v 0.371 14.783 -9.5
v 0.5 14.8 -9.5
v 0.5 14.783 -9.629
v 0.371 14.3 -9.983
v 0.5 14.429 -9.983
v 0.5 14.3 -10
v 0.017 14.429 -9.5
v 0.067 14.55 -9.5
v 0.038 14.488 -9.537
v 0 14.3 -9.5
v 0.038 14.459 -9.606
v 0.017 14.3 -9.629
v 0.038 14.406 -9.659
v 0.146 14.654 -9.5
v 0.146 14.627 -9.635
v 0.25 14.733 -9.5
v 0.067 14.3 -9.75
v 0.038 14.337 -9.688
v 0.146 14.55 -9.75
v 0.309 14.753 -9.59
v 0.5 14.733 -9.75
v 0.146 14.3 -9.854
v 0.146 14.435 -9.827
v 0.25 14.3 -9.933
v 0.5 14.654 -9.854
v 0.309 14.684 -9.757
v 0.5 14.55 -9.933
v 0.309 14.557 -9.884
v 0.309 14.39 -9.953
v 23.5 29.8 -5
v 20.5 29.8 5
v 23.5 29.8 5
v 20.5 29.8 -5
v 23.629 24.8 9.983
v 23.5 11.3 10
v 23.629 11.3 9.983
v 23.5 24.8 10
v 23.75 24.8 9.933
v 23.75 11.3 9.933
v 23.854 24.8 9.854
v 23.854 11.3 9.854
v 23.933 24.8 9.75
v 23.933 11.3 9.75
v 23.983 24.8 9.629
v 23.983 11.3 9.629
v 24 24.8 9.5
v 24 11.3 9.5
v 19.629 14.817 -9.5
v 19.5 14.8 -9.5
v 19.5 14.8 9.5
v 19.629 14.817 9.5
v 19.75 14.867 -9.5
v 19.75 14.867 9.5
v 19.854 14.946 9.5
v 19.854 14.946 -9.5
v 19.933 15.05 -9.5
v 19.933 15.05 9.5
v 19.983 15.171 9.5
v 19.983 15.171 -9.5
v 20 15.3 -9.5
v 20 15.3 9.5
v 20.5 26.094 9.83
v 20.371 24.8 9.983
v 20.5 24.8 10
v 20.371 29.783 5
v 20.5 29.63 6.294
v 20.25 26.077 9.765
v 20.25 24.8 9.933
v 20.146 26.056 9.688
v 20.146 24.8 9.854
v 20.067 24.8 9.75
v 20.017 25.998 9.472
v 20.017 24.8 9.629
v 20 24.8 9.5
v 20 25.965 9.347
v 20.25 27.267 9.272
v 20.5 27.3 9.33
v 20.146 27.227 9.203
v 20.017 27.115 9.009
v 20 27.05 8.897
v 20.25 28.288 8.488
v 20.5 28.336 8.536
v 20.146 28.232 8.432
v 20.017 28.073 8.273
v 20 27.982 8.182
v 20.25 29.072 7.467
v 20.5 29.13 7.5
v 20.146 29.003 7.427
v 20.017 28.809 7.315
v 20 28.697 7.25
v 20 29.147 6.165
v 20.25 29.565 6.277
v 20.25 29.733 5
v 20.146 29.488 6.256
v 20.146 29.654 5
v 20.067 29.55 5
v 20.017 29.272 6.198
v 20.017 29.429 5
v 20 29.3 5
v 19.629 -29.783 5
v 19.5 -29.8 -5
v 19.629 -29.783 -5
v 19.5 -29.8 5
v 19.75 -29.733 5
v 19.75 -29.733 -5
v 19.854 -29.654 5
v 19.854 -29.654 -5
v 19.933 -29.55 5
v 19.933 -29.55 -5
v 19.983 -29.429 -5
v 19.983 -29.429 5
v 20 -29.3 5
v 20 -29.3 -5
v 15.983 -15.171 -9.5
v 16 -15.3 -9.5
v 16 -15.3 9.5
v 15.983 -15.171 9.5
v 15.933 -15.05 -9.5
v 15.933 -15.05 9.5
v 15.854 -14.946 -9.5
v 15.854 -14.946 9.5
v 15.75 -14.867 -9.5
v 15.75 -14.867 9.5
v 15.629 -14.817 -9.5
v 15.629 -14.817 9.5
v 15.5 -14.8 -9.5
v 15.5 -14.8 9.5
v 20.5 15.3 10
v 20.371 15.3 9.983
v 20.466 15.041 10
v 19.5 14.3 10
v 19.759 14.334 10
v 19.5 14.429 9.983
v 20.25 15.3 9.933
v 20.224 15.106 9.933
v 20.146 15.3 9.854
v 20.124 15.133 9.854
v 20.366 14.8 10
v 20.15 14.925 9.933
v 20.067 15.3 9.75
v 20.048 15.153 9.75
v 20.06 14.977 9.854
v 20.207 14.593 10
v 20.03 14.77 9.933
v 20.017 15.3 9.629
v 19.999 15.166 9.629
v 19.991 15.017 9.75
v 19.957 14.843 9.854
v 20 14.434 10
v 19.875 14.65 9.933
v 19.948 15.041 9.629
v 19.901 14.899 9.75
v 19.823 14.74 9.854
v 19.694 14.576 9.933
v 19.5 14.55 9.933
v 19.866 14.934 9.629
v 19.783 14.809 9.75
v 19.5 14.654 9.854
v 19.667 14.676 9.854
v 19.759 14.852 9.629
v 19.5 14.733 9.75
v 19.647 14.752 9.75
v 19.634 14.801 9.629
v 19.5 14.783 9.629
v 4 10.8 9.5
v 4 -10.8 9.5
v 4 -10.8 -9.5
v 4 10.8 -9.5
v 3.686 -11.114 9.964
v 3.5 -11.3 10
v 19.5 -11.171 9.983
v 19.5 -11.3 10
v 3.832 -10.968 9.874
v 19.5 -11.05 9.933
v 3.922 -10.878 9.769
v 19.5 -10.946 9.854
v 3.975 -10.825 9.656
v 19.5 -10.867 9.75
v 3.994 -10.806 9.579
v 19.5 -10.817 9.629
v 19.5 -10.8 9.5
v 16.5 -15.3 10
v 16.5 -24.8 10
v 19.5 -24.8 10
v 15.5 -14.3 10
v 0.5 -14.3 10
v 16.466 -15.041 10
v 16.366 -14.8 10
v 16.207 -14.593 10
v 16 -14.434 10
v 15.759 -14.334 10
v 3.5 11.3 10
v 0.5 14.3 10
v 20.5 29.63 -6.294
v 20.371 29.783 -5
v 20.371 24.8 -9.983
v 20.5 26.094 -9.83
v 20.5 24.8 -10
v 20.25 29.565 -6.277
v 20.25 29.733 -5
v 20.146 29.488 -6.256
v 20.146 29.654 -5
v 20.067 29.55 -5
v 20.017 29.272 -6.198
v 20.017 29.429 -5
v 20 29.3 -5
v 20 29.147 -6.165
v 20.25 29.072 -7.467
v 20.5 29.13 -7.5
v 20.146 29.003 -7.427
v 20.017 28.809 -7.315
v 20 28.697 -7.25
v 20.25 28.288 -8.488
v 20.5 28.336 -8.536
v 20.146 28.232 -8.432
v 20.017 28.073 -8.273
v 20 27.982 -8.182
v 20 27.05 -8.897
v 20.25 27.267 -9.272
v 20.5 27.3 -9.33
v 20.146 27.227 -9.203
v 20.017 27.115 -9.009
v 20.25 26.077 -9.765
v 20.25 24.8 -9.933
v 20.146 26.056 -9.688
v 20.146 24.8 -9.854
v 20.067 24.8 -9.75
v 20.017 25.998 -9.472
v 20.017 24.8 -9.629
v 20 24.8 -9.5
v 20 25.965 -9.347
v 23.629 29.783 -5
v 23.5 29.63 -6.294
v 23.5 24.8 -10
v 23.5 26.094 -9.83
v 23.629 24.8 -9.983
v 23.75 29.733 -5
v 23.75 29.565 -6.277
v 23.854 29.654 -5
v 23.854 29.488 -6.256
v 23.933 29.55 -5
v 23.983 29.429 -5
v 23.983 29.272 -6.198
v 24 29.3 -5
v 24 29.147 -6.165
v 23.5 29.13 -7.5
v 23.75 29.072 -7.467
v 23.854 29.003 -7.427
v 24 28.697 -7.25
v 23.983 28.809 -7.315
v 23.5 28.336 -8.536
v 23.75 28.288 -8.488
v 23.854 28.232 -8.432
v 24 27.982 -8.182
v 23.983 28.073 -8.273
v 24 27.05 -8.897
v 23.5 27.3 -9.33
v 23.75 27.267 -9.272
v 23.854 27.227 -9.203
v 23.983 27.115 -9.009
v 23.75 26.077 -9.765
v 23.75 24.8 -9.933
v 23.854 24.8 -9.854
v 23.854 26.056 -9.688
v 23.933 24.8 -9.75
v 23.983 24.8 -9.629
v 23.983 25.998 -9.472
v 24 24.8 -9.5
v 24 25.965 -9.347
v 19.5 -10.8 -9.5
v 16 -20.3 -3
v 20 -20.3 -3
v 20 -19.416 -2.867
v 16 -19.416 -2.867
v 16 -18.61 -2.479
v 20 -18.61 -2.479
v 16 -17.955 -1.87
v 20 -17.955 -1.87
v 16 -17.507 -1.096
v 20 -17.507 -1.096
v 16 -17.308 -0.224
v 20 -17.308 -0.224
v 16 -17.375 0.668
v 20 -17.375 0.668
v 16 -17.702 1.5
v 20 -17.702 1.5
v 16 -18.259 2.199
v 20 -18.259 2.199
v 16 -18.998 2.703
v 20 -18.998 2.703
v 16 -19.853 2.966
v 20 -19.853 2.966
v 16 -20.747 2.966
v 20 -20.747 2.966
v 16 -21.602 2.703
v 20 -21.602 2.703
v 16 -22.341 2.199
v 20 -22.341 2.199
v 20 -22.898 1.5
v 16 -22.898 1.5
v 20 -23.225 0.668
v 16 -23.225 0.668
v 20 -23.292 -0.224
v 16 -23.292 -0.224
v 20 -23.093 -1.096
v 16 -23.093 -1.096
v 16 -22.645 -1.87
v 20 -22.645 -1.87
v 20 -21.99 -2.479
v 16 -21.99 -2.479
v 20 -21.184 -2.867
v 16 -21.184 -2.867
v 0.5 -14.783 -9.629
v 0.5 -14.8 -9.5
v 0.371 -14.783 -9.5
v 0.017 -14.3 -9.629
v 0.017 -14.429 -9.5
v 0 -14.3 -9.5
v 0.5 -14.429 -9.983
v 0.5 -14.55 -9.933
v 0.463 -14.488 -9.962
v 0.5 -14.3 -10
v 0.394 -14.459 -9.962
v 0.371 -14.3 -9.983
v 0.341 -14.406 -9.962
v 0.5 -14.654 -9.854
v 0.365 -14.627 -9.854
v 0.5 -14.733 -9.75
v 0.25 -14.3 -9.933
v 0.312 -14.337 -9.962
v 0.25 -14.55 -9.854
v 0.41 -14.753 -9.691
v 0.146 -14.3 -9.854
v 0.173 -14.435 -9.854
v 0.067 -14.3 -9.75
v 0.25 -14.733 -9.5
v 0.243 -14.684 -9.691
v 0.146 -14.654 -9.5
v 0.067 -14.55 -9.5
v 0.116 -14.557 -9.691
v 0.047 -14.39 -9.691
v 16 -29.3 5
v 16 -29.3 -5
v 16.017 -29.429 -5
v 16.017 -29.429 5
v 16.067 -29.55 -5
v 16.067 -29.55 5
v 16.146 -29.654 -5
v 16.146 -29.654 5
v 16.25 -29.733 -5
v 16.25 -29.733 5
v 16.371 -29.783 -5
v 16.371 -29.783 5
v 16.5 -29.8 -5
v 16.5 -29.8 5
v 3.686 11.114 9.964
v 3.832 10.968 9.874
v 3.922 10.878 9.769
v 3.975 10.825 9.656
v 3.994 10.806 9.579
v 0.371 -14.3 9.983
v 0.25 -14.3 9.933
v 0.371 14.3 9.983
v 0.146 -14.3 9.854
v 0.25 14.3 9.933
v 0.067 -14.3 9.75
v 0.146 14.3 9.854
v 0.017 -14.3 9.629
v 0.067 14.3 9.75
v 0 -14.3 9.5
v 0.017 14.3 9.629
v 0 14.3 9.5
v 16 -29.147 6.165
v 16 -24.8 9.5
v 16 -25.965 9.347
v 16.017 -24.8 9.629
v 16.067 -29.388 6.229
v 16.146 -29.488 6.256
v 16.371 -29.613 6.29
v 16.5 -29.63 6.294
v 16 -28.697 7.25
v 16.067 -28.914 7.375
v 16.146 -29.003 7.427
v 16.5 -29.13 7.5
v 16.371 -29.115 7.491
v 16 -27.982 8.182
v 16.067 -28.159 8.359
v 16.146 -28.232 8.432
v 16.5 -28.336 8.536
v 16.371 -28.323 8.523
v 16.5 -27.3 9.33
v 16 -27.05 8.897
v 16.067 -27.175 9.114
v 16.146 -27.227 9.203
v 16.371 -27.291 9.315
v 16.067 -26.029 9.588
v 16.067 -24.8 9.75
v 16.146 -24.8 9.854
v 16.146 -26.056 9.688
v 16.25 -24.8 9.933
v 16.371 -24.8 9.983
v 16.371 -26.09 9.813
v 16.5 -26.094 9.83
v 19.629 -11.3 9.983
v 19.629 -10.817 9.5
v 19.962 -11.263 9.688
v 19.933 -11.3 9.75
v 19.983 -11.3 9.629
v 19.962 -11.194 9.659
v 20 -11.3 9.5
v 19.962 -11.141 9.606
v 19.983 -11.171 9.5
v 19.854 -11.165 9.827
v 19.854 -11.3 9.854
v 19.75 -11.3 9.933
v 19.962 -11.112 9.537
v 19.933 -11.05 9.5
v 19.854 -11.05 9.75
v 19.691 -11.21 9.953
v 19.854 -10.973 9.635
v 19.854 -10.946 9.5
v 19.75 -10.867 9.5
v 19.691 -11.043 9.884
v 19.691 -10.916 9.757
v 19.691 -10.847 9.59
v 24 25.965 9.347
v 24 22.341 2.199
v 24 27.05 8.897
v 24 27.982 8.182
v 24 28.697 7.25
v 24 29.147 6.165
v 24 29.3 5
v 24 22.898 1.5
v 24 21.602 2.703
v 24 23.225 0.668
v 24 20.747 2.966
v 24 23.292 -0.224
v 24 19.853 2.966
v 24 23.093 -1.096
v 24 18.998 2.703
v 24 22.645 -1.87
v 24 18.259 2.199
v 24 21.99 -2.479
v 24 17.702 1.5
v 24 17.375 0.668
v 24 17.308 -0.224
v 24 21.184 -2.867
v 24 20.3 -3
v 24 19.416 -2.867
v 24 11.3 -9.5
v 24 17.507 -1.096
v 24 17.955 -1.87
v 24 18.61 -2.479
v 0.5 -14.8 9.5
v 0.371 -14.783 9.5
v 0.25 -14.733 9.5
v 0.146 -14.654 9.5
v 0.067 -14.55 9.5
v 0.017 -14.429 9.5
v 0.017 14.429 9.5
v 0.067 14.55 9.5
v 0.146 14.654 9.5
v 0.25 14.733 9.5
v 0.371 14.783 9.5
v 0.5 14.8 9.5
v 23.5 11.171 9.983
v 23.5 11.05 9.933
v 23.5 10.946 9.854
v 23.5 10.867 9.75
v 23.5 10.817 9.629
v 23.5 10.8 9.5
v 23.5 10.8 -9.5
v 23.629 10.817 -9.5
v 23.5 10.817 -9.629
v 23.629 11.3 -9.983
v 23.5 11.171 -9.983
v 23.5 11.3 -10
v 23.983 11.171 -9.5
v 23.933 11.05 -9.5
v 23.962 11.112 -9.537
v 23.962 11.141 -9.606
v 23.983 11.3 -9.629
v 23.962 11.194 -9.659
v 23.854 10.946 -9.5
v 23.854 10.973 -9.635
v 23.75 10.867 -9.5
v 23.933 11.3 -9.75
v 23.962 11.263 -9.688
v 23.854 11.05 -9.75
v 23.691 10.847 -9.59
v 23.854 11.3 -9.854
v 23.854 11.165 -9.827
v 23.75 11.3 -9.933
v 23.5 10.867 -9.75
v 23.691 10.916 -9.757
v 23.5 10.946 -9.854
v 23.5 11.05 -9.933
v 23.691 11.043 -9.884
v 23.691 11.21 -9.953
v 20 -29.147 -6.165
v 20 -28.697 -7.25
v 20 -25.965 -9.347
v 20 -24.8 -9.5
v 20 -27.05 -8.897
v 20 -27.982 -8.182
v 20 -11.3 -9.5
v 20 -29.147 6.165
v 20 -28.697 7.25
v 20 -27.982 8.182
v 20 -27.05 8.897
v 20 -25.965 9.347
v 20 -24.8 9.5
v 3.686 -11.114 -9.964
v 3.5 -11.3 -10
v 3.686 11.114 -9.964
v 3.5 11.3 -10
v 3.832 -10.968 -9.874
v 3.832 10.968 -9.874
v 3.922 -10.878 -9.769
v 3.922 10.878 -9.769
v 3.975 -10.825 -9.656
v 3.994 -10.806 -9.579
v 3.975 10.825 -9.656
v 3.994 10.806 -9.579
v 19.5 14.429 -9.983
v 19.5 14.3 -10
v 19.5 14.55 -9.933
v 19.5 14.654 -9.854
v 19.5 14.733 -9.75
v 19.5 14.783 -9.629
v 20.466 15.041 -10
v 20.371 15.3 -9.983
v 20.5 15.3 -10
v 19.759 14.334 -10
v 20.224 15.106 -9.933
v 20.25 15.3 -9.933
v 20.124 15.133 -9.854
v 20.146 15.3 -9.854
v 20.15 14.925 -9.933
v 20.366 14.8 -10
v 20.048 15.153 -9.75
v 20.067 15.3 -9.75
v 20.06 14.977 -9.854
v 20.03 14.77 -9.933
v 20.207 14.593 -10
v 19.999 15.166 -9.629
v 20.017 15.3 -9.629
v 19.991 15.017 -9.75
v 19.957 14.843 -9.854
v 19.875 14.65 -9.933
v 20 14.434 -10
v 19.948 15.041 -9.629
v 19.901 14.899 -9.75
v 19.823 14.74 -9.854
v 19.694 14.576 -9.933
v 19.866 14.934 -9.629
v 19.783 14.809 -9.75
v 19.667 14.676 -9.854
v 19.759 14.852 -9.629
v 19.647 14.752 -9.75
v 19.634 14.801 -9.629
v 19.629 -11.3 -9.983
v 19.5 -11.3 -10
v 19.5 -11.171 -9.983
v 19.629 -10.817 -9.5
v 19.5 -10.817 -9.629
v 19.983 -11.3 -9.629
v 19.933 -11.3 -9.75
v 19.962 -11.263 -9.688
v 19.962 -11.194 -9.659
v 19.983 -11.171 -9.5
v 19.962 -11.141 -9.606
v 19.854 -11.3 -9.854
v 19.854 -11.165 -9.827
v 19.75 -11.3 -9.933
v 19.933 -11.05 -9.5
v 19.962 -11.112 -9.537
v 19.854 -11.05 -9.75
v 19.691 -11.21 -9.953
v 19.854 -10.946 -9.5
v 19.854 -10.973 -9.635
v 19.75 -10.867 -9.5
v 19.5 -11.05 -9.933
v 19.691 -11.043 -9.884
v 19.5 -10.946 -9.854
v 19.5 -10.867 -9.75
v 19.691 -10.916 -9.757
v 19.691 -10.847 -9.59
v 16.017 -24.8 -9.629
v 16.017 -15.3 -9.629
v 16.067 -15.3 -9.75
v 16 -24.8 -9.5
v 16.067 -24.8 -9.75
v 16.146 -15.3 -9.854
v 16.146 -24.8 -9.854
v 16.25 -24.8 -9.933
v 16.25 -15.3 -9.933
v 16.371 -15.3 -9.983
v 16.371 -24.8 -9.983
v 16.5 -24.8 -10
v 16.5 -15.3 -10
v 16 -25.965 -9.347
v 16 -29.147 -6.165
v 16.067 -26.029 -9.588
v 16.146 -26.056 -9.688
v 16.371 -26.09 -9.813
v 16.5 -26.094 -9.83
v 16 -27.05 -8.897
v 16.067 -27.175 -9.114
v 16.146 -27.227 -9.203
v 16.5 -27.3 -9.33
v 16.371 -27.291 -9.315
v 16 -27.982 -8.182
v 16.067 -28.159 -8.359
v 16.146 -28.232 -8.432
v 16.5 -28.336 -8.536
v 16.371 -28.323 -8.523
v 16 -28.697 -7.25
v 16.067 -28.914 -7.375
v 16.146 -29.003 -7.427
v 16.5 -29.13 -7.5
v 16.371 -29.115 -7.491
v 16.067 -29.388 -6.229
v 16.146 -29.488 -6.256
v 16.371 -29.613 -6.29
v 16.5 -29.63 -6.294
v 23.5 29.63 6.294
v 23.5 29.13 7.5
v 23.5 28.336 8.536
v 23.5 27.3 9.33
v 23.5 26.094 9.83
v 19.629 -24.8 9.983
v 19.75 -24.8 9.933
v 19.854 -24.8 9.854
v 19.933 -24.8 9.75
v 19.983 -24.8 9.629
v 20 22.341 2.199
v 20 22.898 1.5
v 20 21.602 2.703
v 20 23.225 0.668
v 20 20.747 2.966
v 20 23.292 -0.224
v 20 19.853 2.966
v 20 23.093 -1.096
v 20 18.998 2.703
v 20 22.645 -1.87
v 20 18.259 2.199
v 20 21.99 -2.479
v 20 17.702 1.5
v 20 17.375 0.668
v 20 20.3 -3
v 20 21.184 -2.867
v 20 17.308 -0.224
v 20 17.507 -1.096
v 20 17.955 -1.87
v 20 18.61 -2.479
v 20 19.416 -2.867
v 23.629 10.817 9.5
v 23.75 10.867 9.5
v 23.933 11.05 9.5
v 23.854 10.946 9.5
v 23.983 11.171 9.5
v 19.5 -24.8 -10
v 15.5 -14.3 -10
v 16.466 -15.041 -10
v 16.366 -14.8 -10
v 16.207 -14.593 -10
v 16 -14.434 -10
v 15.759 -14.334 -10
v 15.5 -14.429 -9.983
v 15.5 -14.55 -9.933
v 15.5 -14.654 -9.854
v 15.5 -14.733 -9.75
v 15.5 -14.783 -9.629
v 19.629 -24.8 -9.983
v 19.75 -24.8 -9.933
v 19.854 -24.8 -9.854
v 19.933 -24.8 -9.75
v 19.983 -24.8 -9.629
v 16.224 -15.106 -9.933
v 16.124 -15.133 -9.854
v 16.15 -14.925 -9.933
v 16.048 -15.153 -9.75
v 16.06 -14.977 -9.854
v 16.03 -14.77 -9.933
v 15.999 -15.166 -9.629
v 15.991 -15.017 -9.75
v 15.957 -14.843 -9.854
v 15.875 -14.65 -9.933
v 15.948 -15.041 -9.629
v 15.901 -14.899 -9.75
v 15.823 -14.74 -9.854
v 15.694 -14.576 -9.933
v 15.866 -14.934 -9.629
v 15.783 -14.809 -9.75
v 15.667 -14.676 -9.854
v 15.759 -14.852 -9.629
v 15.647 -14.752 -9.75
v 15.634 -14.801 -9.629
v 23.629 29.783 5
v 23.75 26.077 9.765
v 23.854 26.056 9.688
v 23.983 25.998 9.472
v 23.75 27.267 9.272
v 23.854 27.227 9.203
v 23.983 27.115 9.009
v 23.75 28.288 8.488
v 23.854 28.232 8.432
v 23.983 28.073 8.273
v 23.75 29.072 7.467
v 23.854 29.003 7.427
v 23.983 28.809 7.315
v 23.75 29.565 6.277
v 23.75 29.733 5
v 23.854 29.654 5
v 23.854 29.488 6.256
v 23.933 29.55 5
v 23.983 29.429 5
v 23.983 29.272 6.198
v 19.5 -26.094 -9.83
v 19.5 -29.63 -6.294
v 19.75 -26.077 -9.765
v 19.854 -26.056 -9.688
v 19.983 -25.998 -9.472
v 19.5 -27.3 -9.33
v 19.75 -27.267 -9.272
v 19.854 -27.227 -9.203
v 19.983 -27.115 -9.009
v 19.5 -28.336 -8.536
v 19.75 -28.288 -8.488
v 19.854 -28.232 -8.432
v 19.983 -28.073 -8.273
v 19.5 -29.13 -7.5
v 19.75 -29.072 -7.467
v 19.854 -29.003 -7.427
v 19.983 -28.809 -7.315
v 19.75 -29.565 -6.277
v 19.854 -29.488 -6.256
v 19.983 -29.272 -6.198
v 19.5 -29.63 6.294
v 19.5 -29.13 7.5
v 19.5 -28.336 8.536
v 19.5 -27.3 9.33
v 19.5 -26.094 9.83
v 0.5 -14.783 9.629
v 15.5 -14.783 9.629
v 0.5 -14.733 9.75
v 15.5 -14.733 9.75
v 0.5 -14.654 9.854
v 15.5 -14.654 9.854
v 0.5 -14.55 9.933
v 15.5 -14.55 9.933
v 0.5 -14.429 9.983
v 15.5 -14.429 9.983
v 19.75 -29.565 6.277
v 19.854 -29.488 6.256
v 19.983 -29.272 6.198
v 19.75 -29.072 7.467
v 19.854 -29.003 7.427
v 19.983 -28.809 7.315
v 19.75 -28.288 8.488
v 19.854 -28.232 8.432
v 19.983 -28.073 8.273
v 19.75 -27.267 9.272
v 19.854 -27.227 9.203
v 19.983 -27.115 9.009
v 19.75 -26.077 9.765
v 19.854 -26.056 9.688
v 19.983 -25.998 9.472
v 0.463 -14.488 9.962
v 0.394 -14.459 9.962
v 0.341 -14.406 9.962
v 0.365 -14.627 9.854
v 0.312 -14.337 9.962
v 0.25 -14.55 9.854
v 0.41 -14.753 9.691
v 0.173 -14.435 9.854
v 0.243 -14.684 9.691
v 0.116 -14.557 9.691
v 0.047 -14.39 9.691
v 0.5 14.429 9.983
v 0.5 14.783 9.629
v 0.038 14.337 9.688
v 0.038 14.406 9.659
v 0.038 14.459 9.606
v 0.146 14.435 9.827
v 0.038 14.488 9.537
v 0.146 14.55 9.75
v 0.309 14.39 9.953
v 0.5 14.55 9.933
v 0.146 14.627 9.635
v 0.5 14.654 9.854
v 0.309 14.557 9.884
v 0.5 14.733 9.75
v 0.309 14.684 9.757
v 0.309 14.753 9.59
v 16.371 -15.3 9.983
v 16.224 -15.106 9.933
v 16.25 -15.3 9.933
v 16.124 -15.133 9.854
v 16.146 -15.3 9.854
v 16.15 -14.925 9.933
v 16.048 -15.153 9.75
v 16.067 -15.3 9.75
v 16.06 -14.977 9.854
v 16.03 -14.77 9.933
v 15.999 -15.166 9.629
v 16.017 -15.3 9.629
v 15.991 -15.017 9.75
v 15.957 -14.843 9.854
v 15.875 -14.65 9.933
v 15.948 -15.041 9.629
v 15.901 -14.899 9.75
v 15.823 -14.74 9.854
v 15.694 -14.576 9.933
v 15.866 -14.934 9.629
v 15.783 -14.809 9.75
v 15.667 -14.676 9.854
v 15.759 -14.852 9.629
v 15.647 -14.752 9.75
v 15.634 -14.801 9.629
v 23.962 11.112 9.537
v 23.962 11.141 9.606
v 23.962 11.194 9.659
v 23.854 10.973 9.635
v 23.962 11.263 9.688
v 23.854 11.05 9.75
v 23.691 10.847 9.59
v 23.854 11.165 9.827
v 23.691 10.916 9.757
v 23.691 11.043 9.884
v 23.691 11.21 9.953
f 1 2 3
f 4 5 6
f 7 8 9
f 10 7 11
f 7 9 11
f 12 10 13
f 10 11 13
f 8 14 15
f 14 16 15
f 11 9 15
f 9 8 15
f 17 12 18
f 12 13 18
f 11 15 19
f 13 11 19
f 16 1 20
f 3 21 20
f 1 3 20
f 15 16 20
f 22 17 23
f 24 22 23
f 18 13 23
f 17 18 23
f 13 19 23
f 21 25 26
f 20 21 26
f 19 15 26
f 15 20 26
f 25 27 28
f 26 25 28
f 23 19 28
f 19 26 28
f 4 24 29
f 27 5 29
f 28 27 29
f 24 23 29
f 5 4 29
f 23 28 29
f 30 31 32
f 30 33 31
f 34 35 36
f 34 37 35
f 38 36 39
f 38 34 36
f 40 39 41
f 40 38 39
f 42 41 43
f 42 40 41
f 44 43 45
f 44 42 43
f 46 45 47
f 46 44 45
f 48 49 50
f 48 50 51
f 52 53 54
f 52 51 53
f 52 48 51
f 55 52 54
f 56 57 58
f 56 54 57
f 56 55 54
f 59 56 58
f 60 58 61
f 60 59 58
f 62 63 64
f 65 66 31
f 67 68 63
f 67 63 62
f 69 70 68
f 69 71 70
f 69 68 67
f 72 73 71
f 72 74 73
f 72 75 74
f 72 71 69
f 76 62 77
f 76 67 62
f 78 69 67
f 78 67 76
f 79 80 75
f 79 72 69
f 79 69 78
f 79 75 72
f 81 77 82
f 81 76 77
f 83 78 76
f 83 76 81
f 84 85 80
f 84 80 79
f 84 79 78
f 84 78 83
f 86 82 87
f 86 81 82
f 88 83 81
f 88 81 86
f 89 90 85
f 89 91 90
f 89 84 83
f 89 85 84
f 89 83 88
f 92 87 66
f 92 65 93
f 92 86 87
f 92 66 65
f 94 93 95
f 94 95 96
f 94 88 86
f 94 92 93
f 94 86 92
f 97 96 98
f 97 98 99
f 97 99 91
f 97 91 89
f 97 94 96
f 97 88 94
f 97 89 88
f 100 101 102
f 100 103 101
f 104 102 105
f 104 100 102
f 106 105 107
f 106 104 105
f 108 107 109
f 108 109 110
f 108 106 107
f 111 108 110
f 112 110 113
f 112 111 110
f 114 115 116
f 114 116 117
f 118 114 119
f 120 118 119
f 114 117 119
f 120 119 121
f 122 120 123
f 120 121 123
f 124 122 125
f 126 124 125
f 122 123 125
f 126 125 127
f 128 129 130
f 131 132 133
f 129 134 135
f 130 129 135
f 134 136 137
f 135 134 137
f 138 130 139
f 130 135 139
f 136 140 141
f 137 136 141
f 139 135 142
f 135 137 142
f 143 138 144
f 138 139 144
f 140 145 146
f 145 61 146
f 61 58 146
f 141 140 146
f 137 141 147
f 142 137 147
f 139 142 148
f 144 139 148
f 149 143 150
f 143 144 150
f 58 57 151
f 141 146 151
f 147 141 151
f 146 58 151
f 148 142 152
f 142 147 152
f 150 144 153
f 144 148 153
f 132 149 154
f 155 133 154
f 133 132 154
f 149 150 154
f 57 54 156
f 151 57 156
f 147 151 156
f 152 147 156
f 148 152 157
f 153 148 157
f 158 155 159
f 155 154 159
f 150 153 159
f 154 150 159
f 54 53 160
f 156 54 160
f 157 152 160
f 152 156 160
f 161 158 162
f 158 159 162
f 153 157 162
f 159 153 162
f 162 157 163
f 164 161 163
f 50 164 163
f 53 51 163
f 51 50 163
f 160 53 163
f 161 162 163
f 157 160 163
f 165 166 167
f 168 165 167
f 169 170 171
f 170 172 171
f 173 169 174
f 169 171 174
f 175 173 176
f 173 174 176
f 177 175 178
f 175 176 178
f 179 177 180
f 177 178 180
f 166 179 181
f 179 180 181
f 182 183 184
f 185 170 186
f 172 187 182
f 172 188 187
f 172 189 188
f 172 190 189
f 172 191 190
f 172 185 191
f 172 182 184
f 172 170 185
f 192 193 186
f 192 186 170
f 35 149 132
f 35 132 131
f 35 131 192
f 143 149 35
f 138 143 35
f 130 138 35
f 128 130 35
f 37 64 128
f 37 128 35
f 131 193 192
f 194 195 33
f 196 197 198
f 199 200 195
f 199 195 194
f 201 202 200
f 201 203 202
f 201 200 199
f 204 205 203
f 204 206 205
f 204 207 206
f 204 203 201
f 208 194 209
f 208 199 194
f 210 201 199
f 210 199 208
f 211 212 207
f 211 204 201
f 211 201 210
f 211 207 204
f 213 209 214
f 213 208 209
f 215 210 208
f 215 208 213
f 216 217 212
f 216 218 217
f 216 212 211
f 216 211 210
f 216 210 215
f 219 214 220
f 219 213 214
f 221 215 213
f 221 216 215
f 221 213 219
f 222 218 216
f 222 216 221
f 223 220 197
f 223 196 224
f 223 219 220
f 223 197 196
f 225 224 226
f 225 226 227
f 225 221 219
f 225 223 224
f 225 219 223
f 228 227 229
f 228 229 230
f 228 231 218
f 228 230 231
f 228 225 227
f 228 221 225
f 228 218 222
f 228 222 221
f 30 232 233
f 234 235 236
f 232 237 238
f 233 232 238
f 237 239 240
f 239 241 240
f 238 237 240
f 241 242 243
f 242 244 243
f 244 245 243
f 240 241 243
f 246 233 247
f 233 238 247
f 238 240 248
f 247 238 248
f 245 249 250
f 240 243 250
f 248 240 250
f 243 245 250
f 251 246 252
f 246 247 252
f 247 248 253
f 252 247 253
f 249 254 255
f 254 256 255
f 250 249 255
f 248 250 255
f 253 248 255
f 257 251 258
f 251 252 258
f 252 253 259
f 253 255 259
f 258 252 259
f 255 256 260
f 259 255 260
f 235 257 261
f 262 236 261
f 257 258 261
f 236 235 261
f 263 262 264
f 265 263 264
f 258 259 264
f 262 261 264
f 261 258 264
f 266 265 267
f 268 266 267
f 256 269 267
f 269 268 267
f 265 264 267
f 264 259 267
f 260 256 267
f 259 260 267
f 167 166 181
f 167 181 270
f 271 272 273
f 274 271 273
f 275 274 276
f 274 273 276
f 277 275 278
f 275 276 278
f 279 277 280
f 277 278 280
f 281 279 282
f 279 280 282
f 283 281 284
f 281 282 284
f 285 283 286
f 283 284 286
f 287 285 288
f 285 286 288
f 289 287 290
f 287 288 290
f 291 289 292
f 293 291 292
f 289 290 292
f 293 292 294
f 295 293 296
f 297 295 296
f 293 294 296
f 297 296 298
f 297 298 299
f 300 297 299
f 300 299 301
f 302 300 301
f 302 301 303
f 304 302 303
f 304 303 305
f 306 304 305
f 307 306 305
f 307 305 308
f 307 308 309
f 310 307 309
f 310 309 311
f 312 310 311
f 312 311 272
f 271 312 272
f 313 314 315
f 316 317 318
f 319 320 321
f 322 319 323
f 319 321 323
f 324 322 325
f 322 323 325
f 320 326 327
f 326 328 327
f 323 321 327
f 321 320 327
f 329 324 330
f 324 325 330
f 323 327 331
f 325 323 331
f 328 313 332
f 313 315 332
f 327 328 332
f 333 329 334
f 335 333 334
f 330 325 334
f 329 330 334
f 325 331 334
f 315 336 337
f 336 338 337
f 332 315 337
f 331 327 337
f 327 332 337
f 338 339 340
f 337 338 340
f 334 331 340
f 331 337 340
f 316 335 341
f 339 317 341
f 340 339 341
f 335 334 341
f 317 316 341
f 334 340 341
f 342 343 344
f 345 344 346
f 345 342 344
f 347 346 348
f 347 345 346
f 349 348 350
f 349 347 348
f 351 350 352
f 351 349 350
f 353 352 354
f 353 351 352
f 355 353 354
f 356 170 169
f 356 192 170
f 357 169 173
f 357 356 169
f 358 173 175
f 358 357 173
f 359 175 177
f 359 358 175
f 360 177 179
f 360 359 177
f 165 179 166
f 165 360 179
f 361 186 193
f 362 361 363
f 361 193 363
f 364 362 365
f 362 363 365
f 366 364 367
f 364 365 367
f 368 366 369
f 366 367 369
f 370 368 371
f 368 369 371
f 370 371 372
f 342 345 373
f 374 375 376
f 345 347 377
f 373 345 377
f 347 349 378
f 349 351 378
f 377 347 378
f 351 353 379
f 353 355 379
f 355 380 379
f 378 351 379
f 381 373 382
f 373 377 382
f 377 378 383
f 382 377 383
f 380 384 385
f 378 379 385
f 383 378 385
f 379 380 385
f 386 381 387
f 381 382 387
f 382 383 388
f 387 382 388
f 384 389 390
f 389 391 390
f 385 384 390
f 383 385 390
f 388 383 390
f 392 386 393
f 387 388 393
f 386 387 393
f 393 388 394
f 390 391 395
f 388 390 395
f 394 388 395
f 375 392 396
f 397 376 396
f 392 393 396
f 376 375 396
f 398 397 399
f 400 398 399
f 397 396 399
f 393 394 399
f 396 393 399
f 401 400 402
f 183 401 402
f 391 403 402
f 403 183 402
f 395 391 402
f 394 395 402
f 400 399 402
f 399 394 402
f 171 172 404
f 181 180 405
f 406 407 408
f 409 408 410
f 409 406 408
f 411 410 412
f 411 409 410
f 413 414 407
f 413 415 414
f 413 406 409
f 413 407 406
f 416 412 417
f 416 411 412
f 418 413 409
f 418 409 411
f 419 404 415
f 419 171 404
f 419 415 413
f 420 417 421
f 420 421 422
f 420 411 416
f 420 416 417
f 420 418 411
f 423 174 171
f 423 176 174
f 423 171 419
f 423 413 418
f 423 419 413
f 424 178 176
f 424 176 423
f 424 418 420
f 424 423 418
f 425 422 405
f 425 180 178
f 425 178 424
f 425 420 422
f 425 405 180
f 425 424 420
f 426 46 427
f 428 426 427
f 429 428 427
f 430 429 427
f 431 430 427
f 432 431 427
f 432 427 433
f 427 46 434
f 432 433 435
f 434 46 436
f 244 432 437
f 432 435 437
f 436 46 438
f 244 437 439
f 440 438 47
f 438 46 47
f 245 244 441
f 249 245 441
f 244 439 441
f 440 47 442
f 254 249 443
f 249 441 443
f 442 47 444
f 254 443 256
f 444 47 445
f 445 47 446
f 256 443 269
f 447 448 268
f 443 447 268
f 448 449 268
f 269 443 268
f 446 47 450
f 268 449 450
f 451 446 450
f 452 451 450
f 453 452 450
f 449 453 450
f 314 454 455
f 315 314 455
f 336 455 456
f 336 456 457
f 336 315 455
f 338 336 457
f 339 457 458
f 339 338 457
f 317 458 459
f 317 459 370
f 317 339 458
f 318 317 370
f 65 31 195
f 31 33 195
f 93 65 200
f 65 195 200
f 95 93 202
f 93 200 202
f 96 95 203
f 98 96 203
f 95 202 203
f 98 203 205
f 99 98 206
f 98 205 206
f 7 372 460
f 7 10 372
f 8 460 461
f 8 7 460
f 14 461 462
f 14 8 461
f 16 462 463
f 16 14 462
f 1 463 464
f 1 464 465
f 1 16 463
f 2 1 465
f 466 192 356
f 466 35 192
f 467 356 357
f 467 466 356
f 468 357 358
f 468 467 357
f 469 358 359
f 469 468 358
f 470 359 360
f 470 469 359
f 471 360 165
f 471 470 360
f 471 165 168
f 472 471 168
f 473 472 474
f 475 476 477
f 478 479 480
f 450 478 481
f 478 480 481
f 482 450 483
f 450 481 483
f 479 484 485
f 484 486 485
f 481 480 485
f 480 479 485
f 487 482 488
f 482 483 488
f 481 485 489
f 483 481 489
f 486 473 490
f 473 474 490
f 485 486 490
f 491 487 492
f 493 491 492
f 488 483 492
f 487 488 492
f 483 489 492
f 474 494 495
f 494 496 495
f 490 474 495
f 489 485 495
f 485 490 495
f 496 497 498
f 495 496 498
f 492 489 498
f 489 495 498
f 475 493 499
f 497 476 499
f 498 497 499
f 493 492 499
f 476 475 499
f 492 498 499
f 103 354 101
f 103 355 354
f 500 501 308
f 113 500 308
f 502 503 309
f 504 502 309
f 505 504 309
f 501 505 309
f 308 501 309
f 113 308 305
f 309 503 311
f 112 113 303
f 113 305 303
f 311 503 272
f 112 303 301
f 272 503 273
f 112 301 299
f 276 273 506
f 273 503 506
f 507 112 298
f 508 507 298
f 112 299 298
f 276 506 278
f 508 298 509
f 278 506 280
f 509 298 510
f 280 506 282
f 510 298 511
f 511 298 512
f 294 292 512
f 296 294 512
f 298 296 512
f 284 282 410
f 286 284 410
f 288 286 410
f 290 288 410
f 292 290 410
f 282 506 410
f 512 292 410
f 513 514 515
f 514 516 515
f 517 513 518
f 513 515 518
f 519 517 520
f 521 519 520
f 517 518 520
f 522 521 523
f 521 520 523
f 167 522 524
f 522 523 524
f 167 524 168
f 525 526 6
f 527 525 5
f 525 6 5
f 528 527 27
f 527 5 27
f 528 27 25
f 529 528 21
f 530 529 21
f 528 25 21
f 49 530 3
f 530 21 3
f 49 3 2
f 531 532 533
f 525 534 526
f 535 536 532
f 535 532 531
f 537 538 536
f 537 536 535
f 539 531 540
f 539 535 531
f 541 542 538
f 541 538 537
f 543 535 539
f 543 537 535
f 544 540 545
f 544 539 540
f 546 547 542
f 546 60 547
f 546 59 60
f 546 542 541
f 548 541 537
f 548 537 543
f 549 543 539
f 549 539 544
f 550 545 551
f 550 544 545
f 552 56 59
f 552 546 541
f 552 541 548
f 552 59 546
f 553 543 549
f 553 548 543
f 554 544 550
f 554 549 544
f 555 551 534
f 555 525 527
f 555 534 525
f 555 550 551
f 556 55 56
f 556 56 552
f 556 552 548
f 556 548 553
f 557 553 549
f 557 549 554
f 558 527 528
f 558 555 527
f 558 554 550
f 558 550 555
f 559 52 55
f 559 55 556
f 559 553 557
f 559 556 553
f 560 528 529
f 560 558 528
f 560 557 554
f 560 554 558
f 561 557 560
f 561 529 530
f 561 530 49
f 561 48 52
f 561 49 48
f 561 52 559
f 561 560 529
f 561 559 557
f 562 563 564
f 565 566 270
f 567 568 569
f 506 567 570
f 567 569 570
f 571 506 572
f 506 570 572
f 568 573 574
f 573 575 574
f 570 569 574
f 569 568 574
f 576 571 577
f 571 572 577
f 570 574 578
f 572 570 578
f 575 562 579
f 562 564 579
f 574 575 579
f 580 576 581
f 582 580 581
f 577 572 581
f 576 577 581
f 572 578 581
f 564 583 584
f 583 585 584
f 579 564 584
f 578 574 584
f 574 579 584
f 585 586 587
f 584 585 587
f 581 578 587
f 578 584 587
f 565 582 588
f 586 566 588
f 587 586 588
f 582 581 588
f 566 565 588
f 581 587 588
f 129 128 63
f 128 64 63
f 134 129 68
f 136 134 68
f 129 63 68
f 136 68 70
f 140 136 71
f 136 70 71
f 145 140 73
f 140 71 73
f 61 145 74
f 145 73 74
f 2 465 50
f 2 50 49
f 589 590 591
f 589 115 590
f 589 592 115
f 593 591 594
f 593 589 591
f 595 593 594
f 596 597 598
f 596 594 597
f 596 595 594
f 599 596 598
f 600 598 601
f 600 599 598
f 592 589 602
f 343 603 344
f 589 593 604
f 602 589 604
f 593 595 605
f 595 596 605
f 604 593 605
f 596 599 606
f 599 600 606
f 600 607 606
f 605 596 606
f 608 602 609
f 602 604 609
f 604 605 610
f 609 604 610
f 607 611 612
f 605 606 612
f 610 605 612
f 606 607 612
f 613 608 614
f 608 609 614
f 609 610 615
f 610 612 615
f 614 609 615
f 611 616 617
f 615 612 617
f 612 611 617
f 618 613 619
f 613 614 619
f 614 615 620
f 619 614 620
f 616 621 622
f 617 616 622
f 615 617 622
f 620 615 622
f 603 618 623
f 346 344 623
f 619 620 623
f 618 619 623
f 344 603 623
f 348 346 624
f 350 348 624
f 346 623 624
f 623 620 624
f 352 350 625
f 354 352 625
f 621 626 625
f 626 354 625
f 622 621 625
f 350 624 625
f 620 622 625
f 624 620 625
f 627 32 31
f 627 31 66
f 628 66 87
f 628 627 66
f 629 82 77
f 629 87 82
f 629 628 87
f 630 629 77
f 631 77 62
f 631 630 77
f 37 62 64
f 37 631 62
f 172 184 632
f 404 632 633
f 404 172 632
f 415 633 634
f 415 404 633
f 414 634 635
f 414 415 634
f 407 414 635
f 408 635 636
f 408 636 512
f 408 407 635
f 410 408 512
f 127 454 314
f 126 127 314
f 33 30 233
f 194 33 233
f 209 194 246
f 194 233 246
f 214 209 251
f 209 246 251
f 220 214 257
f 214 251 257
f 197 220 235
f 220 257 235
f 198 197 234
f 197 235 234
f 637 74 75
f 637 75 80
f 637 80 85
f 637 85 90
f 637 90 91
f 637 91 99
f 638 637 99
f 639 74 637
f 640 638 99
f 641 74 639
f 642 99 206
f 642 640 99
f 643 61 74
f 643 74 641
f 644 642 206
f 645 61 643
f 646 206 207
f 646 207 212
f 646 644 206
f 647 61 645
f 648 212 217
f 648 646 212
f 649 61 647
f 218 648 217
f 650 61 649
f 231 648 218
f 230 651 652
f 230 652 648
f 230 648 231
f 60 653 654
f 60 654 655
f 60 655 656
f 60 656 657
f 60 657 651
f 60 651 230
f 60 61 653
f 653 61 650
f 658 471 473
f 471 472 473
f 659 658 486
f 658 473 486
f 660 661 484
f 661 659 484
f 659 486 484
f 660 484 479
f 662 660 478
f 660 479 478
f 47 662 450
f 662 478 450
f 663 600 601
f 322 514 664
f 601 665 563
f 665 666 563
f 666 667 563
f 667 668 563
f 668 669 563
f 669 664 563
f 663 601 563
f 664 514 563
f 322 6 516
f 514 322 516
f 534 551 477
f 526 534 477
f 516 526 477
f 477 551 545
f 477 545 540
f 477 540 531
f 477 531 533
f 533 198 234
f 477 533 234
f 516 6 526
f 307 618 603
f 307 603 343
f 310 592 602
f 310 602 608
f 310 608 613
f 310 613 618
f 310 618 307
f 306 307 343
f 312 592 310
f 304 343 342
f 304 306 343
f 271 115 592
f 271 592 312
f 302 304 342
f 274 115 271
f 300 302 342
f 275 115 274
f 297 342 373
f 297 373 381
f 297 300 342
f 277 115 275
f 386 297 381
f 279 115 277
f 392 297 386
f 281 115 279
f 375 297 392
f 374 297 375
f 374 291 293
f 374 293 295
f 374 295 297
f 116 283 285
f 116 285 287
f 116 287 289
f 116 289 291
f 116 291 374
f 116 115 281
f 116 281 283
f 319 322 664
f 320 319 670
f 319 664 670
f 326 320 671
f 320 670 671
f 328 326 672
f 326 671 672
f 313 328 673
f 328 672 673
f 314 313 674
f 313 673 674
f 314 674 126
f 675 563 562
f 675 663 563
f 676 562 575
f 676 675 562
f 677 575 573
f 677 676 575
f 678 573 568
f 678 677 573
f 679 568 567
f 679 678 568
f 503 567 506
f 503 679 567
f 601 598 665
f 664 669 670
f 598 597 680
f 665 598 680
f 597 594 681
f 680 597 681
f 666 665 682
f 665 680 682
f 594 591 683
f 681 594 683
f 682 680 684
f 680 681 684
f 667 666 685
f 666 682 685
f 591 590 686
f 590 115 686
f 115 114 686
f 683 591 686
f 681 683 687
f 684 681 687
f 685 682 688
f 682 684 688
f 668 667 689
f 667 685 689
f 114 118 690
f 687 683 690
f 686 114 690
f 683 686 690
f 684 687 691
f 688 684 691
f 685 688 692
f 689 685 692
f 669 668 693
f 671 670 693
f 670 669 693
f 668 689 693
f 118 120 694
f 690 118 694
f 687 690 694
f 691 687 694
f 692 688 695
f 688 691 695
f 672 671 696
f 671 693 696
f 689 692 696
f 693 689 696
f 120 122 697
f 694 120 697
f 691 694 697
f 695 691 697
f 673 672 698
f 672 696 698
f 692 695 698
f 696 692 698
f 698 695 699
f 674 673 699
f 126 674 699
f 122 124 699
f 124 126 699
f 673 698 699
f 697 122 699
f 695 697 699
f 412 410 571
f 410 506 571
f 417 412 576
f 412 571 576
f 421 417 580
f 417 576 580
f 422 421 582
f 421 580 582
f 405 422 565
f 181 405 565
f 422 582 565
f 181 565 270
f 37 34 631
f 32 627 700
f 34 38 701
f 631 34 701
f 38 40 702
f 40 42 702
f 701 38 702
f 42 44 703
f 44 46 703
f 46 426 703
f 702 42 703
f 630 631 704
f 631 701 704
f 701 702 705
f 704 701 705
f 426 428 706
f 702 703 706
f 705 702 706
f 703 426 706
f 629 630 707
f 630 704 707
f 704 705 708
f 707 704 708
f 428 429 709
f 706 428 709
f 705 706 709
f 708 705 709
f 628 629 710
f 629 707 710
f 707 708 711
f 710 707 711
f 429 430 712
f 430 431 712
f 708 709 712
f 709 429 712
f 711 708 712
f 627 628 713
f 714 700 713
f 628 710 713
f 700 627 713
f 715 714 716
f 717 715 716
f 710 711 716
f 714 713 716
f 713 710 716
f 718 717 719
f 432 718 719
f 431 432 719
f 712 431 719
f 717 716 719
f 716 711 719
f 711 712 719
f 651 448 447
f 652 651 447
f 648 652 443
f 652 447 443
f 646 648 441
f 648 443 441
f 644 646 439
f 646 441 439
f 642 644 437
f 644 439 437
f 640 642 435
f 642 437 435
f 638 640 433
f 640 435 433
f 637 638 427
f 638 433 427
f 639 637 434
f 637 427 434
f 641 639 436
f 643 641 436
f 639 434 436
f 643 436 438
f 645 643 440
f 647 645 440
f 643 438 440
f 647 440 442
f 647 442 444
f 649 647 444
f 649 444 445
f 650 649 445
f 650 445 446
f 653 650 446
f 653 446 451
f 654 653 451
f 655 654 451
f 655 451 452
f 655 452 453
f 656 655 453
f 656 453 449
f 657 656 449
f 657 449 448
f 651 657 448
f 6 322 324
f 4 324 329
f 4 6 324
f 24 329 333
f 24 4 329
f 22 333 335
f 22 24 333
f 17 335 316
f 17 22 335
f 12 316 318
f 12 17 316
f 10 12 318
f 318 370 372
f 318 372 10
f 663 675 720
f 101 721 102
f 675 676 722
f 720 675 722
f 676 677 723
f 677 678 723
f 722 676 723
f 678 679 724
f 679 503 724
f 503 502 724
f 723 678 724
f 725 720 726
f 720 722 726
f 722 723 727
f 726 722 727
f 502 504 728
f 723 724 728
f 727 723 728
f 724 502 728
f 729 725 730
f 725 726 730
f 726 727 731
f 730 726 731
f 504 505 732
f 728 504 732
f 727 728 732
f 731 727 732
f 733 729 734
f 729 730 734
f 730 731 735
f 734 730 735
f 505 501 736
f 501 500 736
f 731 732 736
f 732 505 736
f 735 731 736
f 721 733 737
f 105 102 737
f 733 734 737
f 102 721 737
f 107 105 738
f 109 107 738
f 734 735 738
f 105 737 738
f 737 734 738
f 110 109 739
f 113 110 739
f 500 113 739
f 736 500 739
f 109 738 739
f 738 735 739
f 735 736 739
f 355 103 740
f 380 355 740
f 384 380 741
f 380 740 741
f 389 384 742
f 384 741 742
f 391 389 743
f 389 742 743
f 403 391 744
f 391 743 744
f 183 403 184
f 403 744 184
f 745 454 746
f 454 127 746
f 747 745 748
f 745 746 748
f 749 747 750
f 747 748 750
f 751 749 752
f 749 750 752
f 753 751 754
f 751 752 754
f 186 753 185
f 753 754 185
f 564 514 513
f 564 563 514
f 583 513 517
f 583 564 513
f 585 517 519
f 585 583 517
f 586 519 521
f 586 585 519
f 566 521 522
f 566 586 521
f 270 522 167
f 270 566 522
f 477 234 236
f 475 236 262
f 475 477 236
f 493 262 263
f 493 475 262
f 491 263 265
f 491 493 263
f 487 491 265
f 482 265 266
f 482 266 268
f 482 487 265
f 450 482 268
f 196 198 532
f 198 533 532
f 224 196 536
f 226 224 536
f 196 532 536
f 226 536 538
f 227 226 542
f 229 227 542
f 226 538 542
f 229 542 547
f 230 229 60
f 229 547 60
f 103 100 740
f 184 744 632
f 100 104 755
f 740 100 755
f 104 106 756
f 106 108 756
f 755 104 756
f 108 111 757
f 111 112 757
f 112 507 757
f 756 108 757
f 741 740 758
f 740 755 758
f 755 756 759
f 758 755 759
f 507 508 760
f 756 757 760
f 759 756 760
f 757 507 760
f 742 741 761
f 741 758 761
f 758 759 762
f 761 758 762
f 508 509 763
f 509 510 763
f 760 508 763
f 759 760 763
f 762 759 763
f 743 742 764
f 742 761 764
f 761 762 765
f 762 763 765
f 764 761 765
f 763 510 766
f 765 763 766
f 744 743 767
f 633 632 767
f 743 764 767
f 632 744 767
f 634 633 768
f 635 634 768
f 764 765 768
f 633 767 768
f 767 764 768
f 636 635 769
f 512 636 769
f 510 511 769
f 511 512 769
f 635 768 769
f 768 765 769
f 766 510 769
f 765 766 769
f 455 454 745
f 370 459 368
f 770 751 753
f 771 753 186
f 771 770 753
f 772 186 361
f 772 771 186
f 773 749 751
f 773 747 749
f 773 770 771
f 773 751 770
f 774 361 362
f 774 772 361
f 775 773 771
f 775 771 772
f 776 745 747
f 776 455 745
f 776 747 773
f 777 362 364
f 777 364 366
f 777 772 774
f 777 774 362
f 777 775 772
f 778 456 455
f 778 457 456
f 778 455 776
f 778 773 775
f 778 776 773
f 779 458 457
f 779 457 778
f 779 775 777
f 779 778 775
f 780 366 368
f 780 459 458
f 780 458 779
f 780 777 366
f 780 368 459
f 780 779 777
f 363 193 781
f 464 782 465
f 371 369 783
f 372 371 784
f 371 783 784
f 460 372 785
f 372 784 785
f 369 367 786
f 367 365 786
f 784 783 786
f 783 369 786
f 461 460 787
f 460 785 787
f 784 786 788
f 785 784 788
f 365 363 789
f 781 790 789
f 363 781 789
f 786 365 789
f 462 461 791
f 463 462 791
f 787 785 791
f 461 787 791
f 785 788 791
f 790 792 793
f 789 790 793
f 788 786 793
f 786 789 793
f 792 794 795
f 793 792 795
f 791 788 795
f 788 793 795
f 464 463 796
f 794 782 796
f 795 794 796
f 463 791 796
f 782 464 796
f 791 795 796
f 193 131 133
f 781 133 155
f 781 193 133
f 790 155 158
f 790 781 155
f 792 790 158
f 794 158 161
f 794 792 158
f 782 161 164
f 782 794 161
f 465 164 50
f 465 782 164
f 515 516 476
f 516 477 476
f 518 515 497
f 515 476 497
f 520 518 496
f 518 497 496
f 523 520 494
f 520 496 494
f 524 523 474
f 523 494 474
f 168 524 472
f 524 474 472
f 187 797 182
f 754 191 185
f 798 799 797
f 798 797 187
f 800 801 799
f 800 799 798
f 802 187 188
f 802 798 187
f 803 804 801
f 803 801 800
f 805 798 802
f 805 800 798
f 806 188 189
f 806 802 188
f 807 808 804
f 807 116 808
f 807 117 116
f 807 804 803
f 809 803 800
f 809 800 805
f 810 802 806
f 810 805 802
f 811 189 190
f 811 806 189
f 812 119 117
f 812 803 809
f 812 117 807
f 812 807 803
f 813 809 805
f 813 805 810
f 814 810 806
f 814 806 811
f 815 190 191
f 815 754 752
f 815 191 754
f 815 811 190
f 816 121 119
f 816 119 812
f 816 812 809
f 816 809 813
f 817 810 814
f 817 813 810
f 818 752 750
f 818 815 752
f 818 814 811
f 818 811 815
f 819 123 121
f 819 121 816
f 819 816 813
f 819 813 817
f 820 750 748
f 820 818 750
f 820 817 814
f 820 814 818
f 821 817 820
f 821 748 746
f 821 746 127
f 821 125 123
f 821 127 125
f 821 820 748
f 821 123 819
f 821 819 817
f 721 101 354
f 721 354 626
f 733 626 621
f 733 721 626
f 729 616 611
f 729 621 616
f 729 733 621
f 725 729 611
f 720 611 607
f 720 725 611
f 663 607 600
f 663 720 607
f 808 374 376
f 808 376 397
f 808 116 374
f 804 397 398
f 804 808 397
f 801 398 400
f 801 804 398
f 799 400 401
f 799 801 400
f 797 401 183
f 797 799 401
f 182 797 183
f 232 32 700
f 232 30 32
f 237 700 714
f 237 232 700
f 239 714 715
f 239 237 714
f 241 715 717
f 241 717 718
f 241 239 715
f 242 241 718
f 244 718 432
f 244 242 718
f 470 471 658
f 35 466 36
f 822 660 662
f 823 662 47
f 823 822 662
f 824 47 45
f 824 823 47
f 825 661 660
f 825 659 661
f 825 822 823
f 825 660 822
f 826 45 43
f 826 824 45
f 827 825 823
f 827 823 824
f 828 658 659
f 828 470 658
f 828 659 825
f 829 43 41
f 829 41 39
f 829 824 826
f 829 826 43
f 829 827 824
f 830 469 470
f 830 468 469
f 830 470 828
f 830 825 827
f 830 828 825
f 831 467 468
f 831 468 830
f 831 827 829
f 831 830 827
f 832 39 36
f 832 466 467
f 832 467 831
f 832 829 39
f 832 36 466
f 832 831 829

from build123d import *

# Parameters (mm, degrees)
SKETCH2_W           = 20
SKETCH2_H           = 29.6
BOSS_EXTRUDE1_DEPTH = 4
SKETCH3_W           = 20
SKETCH3_H           = 4
BOSS_EXTRUDE2_DEPTH = 20
SKETCH4_W           = 20
SKETCH4_H           = 4
BOSS_EXTRUDE3_DEPTH = 16
SKETCH5_W           = 4
SKETCH5_H           = 20
BOSS_EXTRUDE4_DEPTH = 15
SKETCH6_W           = 4
SKETCH6_H           = 20
BOSS_EXTRUDE5_DEPTH = 15
FILLET1_R           = 5
FILLET3_R           = 0.5
CUT_EXTRUDE2_REACH  = 41.548
SKETCH9_R           = 3
CUT_EXTRUDE3_REACH  = 39.256
SKETCH10_R          = 3


with BuildPart() as part:
    # Sketch2 → Boss-Extrude1 (new body)
    with BuildSketch(Plane(origin=(0, 0, 0), x_dir=(0, 0, -1), z_dir=(1, 0, 0))):
        Rectangle(SKETCH2_W, SKETCH2_H)
    extrude(amount=BOSS_EXTRUDE1_DEPTH)

    # Sketch3 → Boss-Extrude2 (add)
    with BuildSketch(Plane(origin=(4, 0, 0), x_dir=(0, 0, -1), z_dir=(1, 0, 0))):
        with Locations((0, 12.8)):
            Rectangle(SKETCH3_W, SKETCH3_H)
    extrude(amount=BOSS_EXTRUDE2_DEPTH)

    # Sketch4 → Boss-Extrude3 (add)
    with BuildSketch(Plane(origin=(4, 0, 0), x_dir=(0, 0, -1), z_dir=(1, 0, 0))):
        with Locations((0, -12.8)):
            Rectangle(SKETCH4_W, SKETCH4_H)
    extrude(amount=BOSS_EXTRUDE3_DEPTH)

    # Sketch5 → Boss-Extrude4 (add)
    with BuildSketch(Plane(origin=(0, 14.8, 0), x_dir=(1, 0, 0), z_dir=(0, 1, 0))):
        with Locations((22, 0)):
            Rectangle(SKETCH5_W, SKETCH5_H)
    extrude(amount=BOSS_EXTRUDE4_DEPTH)

    # Sketch6 → Boss-Extrude5 (add)
    with BuildSketch(Plane.XZ.offset(14.8)):
        with Locations((18, 0)):
            Rectangle(SKETCH6_W, SKETCH6_H)
    extrude(amount=BOSS_EXTRUDE5_DEPTH)

    # Fillet1
    fillet1_edges = [part.edges().sort_by_distance(p)[0] for p in [
        (22, 29.8, -10),
        (22, 29.8, 10),
        (18, -29.8, 10),
        (18, -29.8, -10),
    ]]
    fillet(fillet1_edges, radius=FILLET1_R)

    # Fillet3
    fillet3_edges = [part.edges().sort_by_distance(p)[0] for p in [
        (4, 0, 10),
        (14, 10.8, 10),
        (14, 10.8, -10),
        (24, 10.8, 0),
        (24, 17.8, -10),
        (4, 0, -10),
        (12, -10.8, 10),
        (12, -10.8, -10),
        (20, -17.8, 10),
        (20, -10.8, 0),
        (10, 14.8, 10),
        (10, 14.8, -10),
        (20, 14.8, 0),
        (0, -14.8, 0),
        (8, -14.8, -10),
        (8, -14.8, 10),
        (16, -14.8, 0),
        (0, 0, 10),
        (0, 14.8, 0),
        (0, 0, -10),
        (20, -29.8, 0),
        (16, -29.8, 0),
        (16, -19.8, -10),
        (16, -19.8, 10),
        (16, -28.335533906, -8.535533906),
        (16, -28.335533906, 8.535533906),
        (24, 17.8, 10),
        (20, 19.8, 10),
        (20, -17.8, -10),
        (20, -28.335533906, -8.535533906),
        (20, -28.335533906, 8.535533906),
        (20, 19.8, -10),
        (24, 29.8, 0),
        (20, 29.8, 0),
        (20, 28.335533906, 8.535533906),
        (20, 28.335533906, -8.535533906),
        (24, 28.335533906, 8.535533906),
        (24, 28.335533906, -8.535533906),
    ]]
    fillet(fillet3_edges, radius=FILLET3_R)

    # Sketch9 → Cut-Extrude2 (cut, up to next)
    with BuildSketch(Plane(origin=(24, 0, 0), x_dir=(0, 0, -1), z_dir=(1, 0, 0)), mode=Mode.PRIVATE) as cut_extrude2_sk1:
        with Locations((0, 20.3)):
            Circle(SKETCH9_R)
    cut_extrude2_tool1 = extrude(cut_extrude2_sk1.sketch, amount=-CUT_EXTRUDE2_REACH, mode=Mode.PRIVATE) & part.part
    add(cut_extrude2_tool1.solids().sort_by_distance((24, 20.3, 0))[0], mode=Mode.SUBTRACT)

    # Sketch10 → Cut-Extrude3 (cut, up to next)
    with BuildSketch(Plane(origin=(20, 0, 0), x_dir=(0, 0, -1), z_dir=(1, 0, 0)), mode=Mode.PRIVATE) as cut_extrude3_sk1:
        with Locations((0, -20.3)):
            Circle(SKETCH10_R)
    cut_extrude3_tool1 = extrude(cut_extrude3_sk1.sketch, amount=-CUT_EXTRUDE3_REACH, mode=Mode.PRIVATE) & part.part
    add(cut_extrude3_tool1.solids().sort_by_distance((20, -20.3, 0))[0], mode=Mode.SUBTRACT)


solid = part.part
